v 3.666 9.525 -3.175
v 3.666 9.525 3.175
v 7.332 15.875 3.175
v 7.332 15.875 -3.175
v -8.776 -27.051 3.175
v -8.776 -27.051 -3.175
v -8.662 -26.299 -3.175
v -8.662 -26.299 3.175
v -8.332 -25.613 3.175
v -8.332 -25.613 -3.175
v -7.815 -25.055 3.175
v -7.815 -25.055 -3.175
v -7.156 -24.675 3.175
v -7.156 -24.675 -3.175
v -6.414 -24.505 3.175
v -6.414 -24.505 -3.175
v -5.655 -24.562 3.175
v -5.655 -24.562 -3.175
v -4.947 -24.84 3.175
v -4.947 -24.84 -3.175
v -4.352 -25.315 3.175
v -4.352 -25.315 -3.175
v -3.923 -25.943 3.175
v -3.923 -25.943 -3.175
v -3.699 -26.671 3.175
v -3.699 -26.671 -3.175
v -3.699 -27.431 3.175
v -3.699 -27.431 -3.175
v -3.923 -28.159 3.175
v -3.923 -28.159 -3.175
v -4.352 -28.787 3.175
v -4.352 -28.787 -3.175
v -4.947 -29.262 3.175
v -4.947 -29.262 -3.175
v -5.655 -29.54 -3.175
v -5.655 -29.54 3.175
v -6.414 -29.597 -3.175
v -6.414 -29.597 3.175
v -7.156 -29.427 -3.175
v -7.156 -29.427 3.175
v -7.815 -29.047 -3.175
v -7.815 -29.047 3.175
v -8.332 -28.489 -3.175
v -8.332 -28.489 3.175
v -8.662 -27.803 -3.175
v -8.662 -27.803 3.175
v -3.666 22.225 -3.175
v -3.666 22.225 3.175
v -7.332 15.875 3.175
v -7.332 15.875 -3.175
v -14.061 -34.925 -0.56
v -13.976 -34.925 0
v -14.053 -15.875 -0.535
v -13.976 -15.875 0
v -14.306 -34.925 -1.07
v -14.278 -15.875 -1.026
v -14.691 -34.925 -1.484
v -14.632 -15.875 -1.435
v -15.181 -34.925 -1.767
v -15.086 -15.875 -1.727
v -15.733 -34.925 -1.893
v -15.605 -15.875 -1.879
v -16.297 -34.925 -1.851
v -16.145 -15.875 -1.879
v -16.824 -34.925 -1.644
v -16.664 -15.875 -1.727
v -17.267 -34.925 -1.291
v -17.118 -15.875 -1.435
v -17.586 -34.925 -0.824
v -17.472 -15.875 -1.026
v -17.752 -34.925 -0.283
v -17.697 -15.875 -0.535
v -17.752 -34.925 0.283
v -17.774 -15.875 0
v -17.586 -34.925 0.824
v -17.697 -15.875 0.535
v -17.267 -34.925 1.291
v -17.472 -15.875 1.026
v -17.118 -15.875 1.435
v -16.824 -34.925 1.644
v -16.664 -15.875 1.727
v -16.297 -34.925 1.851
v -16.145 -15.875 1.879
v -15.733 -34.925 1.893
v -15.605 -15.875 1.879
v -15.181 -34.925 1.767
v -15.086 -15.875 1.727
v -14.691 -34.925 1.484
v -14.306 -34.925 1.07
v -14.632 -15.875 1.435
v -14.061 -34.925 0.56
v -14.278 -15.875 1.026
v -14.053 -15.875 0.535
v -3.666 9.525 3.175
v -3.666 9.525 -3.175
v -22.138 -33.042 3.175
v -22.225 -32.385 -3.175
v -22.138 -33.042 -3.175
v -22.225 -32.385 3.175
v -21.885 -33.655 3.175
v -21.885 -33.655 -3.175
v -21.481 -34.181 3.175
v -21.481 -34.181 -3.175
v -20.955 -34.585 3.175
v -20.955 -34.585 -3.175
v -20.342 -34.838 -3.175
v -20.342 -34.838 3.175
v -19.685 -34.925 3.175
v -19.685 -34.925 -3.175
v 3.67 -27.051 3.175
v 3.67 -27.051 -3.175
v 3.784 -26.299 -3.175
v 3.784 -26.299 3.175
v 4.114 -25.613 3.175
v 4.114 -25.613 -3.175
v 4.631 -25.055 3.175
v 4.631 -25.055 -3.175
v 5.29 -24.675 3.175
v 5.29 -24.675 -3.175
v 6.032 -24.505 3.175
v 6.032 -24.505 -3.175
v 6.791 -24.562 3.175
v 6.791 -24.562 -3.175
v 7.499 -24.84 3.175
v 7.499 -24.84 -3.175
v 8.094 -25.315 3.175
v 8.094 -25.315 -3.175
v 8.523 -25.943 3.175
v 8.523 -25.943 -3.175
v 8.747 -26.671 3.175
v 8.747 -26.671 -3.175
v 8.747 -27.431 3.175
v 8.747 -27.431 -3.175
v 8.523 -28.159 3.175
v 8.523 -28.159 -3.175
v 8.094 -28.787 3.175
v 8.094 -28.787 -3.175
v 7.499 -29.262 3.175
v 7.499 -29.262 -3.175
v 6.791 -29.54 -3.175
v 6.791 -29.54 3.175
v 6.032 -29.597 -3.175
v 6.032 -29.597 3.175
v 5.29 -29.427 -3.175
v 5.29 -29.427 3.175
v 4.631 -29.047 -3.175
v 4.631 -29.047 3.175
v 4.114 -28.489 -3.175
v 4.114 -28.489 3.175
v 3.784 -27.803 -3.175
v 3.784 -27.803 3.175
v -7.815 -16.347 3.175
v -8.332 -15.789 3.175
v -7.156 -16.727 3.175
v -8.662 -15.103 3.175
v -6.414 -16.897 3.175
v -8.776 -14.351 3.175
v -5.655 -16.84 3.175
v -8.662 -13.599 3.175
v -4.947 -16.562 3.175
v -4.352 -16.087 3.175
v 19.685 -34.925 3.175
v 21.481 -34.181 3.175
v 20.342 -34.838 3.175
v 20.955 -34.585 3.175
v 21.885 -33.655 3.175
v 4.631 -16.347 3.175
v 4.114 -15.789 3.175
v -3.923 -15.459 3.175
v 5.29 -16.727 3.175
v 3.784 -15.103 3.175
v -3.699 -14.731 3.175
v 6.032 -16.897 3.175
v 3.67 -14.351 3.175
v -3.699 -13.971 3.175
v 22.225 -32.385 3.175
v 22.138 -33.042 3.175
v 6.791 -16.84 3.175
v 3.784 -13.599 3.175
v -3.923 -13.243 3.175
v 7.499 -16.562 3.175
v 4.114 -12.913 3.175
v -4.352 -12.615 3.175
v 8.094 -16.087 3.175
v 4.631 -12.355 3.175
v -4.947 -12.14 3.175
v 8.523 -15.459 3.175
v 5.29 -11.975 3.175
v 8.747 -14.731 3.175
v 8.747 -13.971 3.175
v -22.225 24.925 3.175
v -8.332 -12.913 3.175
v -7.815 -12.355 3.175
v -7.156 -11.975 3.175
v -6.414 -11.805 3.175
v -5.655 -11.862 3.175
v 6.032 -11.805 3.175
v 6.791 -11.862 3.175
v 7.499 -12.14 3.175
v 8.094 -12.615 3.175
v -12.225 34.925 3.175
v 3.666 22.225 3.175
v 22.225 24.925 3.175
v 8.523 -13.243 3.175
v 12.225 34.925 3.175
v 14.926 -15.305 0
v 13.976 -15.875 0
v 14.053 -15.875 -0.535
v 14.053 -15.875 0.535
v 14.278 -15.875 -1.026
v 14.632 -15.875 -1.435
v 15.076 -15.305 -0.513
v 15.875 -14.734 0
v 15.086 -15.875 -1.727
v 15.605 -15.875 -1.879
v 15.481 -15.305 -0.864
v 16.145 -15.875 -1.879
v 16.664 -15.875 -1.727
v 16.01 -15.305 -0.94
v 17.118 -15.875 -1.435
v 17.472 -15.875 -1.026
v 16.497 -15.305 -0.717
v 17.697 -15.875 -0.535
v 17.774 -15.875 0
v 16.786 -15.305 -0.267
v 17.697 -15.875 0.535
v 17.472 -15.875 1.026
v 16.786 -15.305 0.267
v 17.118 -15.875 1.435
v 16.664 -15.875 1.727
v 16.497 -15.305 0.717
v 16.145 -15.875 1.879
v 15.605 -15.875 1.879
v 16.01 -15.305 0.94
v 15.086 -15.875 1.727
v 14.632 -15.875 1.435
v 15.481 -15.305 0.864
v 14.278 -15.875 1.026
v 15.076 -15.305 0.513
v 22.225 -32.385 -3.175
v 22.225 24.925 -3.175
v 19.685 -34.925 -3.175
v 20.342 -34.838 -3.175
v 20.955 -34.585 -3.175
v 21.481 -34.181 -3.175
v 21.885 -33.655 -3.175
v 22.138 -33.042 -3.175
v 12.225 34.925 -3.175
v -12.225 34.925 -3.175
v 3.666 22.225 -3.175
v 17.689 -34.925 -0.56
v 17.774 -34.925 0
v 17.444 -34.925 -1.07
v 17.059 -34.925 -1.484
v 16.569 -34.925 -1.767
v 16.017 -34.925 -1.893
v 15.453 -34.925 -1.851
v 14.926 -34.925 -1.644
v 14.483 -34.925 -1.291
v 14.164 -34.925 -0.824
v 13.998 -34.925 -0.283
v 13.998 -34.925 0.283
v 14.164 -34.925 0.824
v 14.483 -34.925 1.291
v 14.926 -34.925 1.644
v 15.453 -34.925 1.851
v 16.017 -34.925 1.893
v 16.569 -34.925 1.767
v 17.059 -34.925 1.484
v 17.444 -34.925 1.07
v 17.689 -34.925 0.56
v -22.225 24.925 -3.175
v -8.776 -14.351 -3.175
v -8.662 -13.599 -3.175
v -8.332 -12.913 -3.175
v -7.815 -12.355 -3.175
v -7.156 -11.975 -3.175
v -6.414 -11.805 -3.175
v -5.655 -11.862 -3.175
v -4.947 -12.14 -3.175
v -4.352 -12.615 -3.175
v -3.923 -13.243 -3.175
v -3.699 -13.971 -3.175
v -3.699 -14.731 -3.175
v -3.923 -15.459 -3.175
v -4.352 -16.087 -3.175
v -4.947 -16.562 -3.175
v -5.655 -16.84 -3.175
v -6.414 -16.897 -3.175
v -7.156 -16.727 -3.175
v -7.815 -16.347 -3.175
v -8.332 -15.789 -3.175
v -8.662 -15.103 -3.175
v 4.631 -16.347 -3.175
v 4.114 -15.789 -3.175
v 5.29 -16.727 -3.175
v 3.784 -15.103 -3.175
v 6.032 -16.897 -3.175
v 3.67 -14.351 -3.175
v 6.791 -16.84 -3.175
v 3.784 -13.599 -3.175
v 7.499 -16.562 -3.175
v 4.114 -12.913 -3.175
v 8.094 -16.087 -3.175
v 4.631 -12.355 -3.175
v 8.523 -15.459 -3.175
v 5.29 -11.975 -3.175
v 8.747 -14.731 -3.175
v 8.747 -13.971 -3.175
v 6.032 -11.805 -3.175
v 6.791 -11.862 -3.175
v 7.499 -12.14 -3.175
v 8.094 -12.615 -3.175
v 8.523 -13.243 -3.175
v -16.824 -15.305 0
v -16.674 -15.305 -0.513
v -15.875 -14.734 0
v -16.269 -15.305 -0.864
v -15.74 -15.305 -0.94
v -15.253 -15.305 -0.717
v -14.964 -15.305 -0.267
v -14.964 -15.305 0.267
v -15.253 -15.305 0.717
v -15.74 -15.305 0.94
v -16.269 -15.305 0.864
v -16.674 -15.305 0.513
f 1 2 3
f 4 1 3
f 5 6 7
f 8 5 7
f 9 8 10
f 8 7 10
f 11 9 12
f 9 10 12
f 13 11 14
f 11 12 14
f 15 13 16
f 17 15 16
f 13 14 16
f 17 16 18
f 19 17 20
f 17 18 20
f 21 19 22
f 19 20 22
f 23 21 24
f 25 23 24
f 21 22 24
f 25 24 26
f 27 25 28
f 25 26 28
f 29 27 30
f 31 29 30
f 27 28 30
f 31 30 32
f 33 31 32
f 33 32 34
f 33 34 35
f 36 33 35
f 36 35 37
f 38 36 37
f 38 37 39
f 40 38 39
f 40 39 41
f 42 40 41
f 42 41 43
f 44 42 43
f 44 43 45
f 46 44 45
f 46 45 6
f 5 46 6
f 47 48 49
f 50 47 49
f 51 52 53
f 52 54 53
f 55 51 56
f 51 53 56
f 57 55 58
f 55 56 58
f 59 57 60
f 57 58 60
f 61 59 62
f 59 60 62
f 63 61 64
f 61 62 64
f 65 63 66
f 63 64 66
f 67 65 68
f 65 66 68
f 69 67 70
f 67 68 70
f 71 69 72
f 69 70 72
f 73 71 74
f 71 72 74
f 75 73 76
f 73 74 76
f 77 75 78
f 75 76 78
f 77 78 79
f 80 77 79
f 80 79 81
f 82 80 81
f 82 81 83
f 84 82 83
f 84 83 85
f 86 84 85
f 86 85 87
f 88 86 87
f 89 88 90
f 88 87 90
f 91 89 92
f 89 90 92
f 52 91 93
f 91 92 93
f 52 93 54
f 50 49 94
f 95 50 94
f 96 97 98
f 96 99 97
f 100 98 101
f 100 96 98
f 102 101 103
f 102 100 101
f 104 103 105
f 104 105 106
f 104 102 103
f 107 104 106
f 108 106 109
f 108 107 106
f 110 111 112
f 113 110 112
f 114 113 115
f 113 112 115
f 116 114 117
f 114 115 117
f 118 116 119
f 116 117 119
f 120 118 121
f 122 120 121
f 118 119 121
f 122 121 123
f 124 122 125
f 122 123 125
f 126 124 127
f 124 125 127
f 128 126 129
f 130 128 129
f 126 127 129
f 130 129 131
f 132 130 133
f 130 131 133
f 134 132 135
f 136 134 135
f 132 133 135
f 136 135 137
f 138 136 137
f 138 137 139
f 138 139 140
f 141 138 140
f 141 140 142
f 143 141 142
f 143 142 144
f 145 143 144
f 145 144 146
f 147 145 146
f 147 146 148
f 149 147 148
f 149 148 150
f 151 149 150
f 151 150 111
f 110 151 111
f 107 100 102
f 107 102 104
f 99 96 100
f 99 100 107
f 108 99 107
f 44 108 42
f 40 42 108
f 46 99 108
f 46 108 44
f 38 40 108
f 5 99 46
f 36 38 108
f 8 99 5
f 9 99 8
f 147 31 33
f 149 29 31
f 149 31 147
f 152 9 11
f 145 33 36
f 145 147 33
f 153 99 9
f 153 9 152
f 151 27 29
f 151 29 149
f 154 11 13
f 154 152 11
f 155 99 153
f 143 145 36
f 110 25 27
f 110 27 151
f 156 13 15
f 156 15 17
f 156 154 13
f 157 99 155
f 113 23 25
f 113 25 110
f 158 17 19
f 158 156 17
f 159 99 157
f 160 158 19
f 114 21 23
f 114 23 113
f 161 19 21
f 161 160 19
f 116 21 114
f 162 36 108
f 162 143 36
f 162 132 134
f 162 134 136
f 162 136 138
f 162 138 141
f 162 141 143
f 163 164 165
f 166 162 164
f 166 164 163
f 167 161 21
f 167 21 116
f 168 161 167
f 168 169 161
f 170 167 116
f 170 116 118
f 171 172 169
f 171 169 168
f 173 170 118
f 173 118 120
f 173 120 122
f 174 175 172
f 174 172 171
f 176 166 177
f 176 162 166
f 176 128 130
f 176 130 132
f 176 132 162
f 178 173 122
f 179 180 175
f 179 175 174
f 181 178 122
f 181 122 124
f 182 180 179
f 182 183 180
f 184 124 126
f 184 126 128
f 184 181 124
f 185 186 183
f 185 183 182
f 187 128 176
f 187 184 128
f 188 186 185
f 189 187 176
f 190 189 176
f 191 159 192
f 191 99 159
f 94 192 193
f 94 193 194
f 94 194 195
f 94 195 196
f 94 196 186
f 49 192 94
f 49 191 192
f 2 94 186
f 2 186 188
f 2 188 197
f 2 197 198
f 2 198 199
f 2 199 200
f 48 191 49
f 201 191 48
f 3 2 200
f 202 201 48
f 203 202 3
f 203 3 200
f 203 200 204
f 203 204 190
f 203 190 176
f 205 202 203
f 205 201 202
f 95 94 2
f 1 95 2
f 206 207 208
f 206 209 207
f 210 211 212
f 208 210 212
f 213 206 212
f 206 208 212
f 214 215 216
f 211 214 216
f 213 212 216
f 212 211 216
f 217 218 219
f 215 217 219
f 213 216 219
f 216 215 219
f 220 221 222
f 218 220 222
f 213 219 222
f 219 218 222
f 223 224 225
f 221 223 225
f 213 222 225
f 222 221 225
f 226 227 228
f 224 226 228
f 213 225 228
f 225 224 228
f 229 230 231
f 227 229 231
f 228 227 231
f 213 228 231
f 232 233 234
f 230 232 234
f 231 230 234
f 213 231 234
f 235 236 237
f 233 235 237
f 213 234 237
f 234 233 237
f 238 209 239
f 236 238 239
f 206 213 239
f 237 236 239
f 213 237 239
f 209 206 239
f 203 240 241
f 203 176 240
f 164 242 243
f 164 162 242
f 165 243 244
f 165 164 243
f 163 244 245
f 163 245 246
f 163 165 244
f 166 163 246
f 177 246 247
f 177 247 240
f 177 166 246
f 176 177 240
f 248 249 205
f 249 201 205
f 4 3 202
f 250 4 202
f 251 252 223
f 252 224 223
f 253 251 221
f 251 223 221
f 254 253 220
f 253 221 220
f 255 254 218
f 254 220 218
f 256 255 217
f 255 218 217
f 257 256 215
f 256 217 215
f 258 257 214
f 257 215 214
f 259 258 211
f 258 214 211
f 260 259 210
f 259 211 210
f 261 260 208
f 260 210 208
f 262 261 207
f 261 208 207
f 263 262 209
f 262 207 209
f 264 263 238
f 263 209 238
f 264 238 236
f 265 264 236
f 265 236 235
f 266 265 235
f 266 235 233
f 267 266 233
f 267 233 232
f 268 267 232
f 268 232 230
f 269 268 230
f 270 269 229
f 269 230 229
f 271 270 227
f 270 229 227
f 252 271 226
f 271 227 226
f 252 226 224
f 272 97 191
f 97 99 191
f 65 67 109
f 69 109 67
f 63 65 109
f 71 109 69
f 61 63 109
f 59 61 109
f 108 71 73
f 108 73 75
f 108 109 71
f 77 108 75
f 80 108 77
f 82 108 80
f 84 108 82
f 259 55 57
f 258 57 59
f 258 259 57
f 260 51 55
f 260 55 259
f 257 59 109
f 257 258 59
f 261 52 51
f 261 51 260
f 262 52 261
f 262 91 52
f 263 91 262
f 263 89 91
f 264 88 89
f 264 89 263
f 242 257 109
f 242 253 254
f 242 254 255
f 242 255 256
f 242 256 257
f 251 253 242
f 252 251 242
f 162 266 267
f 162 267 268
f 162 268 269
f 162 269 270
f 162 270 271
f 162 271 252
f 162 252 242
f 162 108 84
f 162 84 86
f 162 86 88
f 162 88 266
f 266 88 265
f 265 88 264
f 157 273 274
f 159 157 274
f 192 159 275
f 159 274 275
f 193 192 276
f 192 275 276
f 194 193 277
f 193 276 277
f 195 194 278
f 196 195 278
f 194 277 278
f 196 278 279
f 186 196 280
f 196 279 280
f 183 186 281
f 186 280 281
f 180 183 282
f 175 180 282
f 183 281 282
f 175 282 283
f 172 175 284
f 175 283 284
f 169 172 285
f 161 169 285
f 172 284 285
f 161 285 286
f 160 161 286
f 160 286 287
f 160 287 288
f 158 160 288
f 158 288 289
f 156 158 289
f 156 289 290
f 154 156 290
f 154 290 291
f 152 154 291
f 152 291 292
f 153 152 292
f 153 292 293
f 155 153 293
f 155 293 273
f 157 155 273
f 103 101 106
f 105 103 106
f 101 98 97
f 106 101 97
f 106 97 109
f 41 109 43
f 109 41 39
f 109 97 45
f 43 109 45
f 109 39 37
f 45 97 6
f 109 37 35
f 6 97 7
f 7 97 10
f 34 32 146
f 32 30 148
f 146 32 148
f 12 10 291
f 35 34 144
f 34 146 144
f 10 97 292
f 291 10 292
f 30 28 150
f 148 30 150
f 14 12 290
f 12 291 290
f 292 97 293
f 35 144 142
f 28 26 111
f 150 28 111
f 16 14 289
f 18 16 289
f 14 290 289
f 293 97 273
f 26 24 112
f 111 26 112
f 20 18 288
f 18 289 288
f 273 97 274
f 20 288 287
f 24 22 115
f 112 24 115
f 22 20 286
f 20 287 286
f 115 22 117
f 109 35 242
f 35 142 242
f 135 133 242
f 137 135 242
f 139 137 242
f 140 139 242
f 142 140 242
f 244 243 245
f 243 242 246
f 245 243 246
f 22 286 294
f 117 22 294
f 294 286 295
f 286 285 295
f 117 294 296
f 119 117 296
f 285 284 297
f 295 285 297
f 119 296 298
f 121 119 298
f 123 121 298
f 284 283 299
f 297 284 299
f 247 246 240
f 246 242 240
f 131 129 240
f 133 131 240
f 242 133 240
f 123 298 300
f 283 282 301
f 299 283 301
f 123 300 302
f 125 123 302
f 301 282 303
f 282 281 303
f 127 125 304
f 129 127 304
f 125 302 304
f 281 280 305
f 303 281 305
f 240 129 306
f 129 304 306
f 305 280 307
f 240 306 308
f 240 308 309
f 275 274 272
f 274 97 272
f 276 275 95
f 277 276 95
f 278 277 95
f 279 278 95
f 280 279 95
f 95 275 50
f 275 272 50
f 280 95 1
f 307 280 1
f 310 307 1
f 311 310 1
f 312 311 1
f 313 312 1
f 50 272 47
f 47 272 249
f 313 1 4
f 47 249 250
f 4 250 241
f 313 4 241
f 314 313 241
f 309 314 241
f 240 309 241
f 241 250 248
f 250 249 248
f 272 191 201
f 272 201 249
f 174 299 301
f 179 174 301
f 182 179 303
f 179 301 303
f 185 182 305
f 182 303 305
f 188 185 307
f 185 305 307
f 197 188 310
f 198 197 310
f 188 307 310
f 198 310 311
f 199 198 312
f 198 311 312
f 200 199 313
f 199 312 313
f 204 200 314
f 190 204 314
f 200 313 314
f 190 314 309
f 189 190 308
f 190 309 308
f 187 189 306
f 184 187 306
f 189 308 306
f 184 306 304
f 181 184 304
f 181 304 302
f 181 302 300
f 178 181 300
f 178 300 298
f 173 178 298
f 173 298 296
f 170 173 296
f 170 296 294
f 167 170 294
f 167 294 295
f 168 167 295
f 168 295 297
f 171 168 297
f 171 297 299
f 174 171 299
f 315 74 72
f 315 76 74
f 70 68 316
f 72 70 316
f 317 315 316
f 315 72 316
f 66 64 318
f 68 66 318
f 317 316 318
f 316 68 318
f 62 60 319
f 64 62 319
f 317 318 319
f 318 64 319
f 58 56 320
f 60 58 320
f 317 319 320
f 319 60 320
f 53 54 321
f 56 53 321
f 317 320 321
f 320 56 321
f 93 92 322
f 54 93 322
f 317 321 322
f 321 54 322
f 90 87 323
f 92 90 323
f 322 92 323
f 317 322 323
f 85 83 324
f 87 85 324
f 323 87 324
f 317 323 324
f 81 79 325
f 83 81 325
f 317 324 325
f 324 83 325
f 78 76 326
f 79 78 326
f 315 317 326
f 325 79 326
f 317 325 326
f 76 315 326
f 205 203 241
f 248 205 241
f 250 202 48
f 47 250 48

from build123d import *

# Parameters (mm, degrees)
SKETCH1_W                      = 44.45
SKETCH1_H                      = 69.85
BOSS_EXTRUDE1_DEPTH            = 3.175
CHAMFER1_SIZE                  = 10
CUT_EXTRUDE1_DEPTH             = 7.35
TAP_DRILL_FOR_10_24_TAP1_D     = 3.7973
TAP_DRILL_FOR_10_24_TAP1_DEPTH = 19.05
TAP_DRILL_FOR_10_24_TAP1_TIP   = 1.140824014
F_10_CLEARANCE_HOLE1_D         = 5.1054
F_10_CLEARANCE_HOLE1_DEPTH     = 12.7
F_10_CLEARANCE_HOLE1_TIP       = 1.533816902
FILLET1_R                      = 2.54


with BuildPart() as part:
    # Sketch1 → Boss-Extrude1 (new body, symmetric)
    with BuildSketch(Plane.XY):
        Rectangle(SKETCH1_W, SKETCH1_H)
    extrude(amount=BOSS_EXTRUDE1_DEPTH, both=True)

    # Chamfer1
    chamfer1_edges = [part.edges().sort_by_distance(p)[0] for p in [
        (-22.225, 34.925, 0),
        (22.225, 34.925, 0),
    ]]
    chamfer(chamfer1_edges, length=CHAMFER1_SIZE)

    # Sketch2 → Cut-Extrude1 (cut, through all)
    with BuildSketch(Plane.XY.offset(3.175)):
        Polygon((7.332348419, 15.875), (3.666174209, 22.225), (-3.666174209, 22.225), (-7.332348419, 15.875), (-3.666174209, 9.525), (3.666174209, 9.525), align=None)
    extrude(amount=-CUT_EXTRUDE1_DEPTH, mode=Mode.SUBTRACT)

    # Tap Drill for #10-24 Tap1
    with Locations(Plane(origin=(0, -34.925, 0), x_dir=(-1, 0, 0), z_dir=(0, -1, 0))):
        with Locations((15.875, 0), (-15.875, 0)):
            Hole(TAP_DRILL_FOR_10_24_TAP1_D / 2, depth=TAP_DRILL_FOR_10_24_TAP1_DEPTH)
            with Locations((0, 0, -(TAP_DRILL_FOR_10_24_TAP1_DEPTH + TAP_DRILL_FOR_10_24_TAP1_TIP / 2))):  # 118° drill point
                Cone(0, TAP_DRILL_FOR_10_24_TAP1_D / 2, TAP_DRILL_FOR_10_24_TAP1_TIP, mode=Mode.SUBTRACT)

    # #10 Clearance Hole1
    with Locations(Plane.XY.offset(3.175)):
        with Locations((-6.223, -14.351), (6.223, -14.351), (6.223, -27.051), (-6.223, -27.051)):
            Hole(F_10_CLEARANCE_HOLE1_D / 2, depth=F_10_CLEARANCE_HOLE1_DEPTH)
            with Locations((0, 0, -(F_10_CLEARANCE_HOLE1_DEPTH + F_10_CLEARANCE_HOLE1_TIP / 2))):  # 118° drill point
                Cone(0, F_10_CLEARANCE_HOLE1_D / 2, F_10_CLEARANCE_HOLE1_TIP, mode=Mode.SUBTRACT)

    # Fillet1
    fillet1_edges = [part.edges().sort_by_distance(p)[0] for p in [
        (22.225, -34.925, 0),
        (-22.225, -34.925, 0),
    ]]
    fillet(fillet1_edges, radius=FILLET1_R)


solid = part.part
